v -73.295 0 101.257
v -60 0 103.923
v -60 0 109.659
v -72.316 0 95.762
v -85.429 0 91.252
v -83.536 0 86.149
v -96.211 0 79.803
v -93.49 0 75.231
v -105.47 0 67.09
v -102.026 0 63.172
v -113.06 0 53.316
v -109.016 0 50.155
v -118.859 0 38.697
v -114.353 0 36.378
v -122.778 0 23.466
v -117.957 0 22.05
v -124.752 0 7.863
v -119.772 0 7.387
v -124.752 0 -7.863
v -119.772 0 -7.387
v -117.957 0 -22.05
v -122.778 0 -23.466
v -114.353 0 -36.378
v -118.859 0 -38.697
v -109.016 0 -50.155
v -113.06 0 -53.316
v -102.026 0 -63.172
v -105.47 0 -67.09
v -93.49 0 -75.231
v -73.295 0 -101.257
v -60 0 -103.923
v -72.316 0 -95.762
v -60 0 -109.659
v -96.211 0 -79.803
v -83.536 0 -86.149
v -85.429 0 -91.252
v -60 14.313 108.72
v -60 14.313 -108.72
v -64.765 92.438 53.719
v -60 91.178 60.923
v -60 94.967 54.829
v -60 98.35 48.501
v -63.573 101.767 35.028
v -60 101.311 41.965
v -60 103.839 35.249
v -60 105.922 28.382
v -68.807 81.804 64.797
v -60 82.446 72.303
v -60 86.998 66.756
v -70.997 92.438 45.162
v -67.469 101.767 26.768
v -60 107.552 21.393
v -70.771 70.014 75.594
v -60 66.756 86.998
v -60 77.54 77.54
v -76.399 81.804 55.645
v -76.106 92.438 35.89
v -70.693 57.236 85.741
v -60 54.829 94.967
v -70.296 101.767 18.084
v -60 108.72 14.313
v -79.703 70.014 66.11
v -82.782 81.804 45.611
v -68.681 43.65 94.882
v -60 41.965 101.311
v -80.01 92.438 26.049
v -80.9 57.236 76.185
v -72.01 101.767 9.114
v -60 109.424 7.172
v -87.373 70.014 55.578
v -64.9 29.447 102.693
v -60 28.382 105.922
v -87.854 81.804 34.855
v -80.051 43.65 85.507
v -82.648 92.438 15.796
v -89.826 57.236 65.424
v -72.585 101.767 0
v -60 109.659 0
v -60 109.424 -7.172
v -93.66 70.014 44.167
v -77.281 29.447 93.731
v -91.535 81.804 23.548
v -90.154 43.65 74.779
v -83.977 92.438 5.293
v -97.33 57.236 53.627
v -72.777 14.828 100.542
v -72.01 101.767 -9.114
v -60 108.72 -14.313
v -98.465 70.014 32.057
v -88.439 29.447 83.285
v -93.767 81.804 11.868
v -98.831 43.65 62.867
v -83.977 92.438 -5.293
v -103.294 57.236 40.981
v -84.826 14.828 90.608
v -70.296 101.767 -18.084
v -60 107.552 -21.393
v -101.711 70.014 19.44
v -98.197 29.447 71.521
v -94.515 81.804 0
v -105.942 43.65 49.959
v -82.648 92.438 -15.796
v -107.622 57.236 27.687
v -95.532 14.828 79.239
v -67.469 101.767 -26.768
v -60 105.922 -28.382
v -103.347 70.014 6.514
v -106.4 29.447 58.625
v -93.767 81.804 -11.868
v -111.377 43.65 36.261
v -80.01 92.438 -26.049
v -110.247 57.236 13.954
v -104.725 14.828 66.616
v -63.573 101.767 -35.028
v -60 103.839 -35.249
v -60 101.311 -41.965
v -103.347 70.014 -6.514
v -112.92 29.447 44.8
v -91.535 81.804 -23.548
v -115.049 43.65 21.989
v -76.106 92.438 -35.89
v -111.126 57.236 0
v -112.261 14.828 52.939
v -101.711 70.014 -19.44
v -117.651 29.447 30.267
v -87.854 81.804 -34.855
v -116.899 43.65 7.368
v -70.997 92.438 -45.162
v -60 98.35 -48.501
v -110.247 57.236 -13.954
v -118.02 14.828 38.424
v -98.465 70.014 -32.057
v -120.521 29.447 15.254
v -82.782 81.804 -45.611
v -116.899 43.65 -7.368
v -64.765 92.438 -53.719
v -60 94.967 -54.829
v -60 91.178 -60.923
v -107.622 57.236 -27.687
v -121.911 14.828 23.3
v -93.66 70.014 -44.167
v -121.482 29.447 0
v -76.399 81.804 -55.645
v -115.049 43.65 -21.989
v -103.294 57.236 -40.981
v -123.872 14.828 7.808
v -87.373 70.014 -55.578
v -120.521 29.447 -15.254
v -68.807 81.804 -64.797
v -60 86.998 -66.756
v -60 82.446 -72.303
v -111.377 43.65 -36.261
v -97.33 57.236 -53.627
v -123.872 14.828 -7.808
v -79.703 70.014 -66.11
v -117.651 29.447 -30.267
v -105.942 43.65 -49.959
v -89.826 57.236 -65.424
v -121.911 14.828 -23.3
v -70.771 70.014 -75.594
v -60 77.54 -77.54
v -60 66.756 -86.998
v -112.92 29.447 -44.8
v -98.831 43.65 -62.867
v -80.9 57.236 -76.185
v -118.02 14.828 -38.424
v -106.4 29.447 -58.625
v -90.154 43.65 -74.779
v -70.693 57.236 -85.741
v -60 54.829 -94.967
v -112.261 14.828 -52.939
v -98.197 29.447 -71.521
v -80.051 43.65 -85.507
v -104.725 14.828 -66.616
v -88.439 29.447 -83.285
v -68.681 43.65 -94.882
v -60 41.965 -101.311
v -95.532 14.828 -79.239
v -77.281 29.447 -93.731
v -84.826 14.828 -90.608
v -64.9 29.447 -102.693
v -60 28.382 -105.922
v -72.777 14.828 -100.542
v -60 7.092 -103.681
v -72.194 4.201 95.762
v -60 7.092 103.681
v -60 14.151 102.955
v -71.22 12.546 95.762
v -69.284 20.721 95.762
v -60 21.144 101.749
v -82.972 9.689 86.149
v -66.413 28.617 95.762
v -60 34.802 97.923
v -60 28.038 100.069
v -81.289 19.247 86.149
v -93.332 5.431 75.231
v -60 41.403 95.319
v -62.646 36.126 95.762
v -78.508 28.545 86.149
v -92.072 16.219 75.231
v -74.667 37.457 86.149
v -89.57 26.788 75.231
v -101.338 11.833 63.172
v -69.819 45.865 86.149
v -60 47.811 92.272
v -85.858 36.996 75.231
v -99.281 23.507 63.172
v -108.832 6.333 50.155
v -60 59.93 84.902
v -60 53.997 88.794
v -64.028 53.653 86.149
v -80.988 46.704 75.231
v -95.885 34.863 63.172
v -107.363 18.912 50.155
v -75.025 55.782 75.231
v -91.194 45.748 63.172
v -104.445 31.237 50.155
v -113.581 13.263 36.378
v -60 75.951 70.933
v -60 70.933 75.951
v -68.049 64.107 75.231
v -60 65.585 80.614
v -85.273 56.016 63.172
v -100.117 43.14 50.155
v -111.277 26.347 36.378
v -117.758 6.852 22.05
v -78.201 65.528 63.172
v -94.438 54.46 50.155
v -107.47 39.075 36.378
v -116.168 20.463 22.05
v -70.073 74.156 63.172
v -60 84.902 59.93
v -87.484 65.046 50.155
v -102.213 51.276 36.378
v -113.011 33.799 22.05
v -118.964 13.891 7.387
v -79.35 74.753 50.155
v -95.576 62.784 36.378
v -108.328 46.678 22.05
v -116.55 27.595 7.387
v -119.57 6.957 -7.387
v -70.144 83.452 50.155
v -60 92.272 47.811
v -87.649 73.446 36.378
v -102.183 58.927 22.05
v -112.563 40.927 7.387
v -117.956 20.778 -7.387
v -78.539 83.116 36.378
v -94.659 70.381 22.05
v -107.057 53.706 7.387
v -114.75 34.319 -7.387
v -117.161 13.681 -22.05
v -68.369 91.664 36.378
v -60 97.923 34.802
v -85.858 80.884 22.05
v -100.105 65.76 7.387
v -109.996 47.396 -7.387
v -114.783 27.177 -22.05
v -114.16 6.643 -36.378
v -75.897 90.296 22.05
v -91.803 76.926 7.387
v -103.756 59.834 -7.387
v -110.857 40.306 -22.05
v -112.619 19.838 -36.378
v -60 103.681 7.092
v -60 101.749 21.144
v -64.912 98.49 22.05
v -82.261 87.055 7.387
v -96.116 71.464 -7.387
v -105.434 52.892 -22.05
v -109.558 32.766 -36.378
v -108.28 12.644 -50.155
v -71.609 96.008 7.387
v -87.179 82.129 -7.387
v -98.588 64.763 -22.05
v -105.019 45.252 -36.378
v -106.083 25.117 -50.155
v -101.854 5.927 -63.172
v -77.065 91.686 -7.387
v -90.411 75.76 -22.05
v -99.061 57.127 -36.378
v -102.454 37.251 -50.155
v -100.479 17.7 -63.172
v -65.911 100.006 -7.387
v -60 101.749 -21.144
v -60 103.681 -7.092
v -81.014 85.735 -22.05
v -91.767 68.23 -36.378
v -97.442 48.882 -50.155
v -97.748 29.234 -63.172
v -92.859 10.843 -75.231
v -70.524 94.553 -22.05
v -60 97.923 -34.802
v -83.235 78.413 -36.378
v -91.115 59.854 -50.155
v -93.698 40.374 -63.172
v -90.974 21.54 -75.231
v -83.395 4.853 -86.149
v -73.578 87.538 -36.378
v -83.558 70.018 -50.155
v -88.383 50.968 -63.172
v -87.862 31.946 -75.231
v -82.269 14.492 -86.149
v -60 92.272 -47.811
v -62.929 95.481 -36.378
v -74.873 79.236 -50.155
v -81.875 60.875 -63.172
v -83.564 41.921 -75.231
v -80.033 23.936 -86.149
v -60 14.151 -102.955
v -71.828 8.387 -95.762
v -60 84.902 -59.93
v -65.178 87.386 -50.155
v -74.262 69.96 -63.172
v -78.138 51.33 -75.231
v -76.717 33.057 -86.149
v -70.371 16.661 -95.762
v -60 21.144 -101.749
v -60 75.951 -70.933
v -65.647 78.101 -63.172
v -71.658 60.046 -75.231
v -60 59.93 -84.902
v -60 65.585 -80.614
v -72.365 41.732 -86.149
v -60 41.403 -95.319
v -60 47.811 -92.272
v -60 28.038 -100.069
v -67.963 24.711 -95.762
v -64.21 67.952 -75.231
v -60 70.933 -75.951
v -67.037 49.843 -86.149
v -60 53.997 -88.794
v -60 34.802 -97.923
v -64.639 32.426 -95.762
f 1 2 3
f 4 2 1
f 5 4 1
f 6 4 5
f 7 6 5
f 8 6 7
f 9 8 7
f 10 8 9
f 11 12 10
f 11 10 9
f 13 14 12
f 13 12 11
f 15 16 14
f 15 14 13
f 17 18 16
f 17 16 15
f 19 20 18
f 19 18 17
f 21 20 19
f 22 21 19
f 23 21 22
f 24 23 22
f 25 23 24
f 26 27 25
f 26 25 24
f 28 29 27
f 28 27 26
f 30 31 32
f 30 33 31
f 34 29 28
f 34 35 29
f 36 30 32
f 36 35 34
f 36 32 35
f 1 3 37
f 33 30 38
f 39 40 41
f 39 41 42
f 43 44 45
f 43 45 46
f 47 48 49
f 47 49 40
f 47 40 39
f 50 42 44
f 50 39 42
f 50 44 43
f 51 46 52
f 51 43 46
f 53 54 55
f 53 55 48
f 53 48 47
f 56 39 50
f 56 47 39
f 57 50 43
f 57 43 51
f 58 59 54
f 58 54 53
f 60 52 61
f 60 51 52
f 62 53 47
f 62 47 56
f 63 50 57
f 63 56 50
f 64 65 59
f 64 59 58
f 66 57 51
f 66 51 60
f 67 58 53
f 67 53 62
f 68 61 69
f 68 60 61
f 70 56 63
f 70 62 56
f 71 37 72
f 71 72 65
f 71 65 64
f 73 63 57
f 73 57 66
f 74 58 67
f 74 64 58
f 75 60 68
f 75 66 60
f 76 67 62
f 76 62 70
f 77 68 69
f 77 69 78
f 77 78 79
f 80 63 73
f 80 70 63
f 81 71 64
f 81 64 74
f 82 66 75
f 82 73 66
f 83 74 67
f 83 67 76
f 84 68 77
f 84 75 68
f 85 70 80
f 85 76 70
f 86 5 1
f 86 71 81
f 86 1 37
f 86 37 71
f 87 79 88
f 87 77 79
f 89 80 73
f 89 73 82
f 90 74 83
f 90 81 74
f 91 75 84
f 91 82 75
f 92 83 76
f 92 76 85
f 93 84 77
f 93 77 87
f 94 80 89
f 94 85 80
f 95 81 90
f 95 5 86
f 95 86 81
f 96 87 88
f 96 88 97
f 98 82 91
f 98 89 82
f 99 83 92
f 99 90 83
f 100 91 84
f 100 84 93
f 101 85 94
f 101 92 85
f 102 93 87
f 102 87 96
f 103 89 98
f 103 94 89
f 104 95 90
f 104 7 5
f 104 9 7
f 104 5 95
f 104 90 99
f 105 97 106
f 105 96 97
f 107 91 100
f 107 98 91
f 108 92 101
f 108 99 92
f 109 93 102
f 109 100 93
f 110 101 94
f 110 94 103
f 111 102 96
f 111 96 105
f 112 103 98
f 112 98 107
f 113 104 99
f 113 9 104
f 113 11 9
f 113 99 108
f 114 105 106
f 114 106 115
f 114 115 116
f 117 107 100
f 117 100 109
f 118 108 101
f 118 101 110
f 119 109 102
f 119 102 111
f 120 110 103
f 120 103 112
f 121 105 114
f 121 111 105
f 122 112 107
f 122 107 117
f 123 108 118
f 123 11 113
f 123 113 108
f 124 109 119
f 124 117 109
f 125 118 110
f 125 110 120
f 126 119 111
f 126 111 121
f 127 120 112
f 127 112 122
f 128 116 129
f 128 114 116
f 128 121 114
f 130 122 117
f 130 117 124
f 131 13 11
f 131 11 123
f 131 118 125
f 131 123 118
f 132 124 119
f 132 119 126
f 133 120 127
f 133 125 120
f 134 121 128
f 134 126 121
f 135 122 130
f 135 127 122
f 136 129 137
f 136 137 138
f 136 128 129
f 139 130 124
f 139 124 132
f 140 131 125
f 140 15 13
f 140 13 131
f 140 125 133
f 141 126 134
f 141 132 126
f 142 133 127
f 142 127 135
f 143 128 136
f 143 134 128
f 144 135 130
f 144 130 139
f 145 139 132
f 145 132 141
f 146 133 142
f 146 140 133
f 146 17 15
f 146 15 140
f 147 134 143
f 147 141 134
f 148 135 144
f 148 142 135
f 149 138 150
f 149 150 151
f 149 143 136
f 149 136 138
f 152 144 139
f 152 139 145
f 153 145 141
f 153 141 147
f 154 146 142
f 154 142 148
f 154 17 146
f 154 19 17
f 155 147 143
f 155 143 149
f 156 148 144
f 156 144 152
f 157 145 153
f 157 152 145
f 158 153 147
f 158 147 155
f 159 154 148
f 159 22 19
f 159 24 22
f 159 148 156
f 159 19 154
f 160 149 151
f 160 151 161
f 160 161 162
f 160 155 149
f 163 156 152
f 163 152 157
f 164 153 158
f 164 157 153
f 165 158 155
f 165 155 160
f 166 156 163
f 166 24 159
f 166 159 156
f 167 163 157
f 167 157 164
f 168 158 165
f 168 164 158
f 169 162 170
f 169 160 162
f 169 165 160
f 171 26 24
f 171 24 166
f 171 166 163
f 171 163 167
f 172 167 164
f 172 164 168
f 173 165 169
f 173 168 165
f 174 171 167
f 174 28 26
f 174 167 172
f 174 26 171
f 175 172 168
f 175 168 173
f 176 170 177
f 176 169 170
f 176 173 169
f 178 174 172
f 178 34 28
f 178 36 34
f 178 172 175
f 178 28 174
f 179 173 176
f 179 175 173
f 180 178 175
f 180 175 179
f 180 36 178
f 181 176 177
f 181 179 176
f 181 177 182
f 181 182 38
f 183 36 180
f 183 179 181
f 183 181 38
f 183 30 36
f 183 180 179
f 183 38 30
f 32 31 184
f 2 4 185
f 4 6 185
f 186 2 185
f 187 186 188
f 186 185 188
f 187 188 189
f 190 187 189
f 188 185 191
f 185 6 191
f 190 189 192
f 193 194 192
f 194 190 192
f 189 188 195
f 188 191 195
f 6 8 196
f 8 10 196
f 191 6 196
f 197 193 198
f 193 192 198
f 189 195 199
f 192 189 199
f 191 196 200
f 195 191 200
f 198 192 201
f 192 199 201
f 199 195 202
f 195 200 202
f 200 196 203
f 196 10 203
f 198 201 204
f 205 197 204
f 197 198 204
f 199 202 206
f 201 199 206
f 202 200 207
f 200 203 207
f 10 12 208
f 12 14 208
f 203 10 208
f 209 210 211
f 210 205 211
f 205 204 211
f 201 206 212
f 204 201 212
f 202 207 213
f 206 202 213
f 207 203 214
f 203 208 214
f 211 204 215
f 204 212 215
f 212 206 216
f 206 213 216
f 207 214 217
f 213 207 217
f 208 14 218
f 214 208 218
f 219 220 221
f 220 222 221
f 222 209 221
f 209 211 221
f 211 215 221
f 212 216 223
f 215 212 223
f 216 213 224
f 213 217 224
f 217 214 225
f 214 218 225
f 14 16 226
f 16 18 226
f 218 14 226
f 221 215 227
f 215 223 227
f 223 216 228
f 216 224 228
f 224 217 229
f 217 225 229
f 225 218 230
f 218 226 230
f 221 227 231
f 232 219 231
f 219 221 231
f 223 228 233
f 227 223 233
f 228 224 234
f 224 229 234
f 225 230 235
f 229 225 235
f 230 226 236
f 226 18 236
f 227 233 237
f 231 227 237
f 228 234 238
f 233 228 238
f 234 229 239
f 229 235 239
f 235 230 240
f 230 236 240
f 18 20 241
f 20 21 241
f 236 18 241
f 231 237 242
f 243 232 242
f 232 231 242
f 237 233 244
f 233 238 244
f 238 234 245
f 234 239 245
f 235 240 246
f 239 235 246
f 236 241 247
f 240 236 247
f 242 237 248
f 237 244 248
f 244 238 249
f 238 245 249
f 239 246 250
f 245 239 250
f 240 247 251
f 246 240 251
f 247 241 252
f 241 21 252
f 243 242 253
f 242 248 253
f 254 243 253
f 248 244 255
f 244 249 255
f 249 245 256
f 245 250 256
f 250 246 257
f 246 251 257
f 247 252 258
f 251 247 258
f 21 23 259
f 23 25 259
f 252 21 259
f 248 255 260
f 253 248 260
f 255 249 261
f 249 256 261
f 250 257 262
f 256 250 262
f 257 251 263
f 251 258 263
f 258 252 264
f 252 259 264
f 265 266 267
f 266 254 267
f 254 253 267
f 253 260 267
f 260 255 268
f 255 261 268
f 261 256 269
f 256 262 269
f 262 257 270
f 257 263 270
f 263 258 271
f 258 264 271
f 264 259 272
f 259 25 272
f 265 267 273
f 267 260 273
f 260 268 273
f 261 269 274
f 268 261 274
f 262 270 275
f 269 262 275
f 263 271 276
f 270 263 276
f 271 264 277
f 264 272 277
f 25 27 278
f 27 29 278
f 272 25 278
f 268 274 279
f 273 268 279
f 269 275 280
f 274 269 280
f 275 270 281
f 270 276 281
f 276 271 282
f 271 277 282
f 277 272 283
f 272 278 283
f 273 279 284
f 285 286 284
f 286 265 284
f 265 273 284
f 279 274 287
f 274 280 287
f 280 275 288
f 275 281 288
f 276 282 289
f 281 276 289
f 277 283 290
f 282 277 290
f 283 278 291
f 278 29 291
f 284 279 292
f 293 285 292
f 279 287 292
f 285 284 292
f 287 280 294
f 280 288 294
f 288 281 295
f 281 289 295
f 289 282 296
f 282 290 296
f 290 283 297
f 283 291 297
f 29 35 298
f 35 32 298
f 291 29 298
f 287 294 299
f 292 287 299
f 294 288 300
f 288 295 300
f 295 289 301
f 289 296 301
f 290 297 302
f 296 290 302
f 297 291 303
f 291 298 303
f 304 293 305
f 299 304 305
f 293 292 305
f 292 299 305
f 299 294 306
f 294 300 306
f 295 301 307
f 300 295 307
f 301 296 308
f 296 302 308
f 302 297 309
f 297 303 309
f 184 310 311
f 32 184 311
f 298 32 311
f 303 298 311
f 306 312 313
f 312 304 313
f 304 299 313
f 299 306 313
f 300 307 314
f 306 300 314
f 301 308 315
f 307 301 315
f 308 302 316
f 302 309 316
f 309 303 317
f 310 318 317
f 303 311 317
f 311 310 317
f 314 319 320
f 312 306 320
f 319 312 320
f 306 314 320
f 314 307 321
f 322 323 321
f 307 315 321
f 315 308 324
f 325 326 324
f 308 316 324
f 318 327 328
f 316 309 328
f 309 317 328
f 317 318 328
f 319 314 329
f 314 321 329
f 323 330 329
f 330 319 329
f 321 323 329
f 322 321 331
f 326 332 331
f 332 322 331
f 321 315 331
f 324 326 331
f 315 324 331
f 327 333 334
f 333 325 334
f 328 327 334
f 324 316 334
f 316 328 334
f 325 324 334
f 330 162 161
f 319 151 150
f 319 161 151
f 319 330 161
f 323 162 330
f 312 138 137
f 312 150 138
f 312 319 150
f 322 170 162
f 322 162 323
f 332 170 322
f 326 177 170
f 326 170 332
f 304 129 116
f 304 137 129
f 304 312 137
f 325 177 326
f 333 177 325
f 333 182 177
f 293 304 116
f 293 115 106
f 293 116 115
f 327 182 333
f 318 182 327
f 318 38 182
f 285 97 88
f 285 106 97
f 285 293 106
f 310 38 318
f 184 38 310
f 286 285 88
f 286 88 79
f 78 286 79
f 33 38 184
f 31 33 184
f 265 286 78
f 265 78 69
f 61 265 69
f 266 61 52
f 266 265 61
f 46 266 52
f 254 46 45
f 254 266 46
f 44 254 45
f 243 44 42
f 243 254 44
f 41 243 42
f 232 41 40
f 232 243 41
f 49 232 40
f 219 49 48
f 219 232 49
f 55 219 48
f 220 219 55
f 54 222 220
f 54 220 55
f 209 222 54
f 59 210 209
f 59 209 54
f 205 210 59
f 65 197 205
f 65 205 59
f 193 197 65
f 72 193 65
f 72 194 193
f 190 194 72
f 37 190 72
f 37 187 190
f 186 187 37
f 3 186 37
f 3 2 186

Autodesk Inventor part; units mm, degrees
ref_plane "YZ Plane" through (0, 0, 0) normal (1, 0, 0) x (0, 1, 0)
ref_plane "XZ Plane" through (0, 0, 0) normal (0, 1, 0) x (-1, 0, 0)
ref_plane "XY Plane" through (0, 0, 0) normal (0, 0, 1) x (1, 0, 0)
sketch "スケッチ1" plane through (0, 0, 0) normal (0, 0, 1) x (1, 0, 0)
  arc A0 (0, 125) -> (-125, 0) centre (0, 0) ccw
  line L0 (0, 125) -> (0, 0)
  line L1 (0, 0) -> (-125, 0)
  point P0 (0, 0)
  dimension "d0" = 125
  dimension "d1" = 125
  dimension "d2" = 125
revolve "回転1" add sketch "スケッチ1" angle 360 about axis through (0, 125, 0) along (0, -1, 0)
sketch "スケッチ2" plane through (0, 0, 0) normal (0, -1, 0) x (1, 0, 0)
  line L0 (60, -130) -> (-60, -130)
  line L1 (-60, -130) -> (-60, 130)
  line L2 (-60, 130) -> (60, 130)
  line L3 (60, 130) -> (60, -130)
  line L4 (60, -130) -> (-60, 130) construction
  line L5 (-60, -130) -> (60, 130) construction
  line L6 (177.9877, -390) -> (60, -390)
  line L7 (60, -390) -> (60, 130)
  line L8 (60, 130) -> (177.9877, 130)
  line L9 (177.9877, 130) -> (177.9877, -390)
  line L10 (177.9877, -390) -> (60, 130) construction
  line L11 (60, -390) -> (177.9877, 130) construction
  point P0 (0, 0)
  point P1 (118.9938, -130)
  dimension "d4" = 120
  dimension "d5" = 260
extrude "押し出し1" cut sketch "スケッチ2" against normal blind 200
sketch "スケッチ3" plane through (0, 0, 0) normal (0, -1, 0) x (1, 0, 0)
  circle A0 centre (0, 0) radius 120
  line L0 (0, 0) -> (0, 7.6881)
  line L1 (0, 120) -> (0, -120)
  dimension "d8" = 240
revolve "回転2" cut sketch "スケッチ3" angle 360 about axis through (0, 0, 120) along (0, 0, -1) picked at (-69.9662, -38.4642) contours L1 L0 A0
properties material "PC/ABS プラスチック"
